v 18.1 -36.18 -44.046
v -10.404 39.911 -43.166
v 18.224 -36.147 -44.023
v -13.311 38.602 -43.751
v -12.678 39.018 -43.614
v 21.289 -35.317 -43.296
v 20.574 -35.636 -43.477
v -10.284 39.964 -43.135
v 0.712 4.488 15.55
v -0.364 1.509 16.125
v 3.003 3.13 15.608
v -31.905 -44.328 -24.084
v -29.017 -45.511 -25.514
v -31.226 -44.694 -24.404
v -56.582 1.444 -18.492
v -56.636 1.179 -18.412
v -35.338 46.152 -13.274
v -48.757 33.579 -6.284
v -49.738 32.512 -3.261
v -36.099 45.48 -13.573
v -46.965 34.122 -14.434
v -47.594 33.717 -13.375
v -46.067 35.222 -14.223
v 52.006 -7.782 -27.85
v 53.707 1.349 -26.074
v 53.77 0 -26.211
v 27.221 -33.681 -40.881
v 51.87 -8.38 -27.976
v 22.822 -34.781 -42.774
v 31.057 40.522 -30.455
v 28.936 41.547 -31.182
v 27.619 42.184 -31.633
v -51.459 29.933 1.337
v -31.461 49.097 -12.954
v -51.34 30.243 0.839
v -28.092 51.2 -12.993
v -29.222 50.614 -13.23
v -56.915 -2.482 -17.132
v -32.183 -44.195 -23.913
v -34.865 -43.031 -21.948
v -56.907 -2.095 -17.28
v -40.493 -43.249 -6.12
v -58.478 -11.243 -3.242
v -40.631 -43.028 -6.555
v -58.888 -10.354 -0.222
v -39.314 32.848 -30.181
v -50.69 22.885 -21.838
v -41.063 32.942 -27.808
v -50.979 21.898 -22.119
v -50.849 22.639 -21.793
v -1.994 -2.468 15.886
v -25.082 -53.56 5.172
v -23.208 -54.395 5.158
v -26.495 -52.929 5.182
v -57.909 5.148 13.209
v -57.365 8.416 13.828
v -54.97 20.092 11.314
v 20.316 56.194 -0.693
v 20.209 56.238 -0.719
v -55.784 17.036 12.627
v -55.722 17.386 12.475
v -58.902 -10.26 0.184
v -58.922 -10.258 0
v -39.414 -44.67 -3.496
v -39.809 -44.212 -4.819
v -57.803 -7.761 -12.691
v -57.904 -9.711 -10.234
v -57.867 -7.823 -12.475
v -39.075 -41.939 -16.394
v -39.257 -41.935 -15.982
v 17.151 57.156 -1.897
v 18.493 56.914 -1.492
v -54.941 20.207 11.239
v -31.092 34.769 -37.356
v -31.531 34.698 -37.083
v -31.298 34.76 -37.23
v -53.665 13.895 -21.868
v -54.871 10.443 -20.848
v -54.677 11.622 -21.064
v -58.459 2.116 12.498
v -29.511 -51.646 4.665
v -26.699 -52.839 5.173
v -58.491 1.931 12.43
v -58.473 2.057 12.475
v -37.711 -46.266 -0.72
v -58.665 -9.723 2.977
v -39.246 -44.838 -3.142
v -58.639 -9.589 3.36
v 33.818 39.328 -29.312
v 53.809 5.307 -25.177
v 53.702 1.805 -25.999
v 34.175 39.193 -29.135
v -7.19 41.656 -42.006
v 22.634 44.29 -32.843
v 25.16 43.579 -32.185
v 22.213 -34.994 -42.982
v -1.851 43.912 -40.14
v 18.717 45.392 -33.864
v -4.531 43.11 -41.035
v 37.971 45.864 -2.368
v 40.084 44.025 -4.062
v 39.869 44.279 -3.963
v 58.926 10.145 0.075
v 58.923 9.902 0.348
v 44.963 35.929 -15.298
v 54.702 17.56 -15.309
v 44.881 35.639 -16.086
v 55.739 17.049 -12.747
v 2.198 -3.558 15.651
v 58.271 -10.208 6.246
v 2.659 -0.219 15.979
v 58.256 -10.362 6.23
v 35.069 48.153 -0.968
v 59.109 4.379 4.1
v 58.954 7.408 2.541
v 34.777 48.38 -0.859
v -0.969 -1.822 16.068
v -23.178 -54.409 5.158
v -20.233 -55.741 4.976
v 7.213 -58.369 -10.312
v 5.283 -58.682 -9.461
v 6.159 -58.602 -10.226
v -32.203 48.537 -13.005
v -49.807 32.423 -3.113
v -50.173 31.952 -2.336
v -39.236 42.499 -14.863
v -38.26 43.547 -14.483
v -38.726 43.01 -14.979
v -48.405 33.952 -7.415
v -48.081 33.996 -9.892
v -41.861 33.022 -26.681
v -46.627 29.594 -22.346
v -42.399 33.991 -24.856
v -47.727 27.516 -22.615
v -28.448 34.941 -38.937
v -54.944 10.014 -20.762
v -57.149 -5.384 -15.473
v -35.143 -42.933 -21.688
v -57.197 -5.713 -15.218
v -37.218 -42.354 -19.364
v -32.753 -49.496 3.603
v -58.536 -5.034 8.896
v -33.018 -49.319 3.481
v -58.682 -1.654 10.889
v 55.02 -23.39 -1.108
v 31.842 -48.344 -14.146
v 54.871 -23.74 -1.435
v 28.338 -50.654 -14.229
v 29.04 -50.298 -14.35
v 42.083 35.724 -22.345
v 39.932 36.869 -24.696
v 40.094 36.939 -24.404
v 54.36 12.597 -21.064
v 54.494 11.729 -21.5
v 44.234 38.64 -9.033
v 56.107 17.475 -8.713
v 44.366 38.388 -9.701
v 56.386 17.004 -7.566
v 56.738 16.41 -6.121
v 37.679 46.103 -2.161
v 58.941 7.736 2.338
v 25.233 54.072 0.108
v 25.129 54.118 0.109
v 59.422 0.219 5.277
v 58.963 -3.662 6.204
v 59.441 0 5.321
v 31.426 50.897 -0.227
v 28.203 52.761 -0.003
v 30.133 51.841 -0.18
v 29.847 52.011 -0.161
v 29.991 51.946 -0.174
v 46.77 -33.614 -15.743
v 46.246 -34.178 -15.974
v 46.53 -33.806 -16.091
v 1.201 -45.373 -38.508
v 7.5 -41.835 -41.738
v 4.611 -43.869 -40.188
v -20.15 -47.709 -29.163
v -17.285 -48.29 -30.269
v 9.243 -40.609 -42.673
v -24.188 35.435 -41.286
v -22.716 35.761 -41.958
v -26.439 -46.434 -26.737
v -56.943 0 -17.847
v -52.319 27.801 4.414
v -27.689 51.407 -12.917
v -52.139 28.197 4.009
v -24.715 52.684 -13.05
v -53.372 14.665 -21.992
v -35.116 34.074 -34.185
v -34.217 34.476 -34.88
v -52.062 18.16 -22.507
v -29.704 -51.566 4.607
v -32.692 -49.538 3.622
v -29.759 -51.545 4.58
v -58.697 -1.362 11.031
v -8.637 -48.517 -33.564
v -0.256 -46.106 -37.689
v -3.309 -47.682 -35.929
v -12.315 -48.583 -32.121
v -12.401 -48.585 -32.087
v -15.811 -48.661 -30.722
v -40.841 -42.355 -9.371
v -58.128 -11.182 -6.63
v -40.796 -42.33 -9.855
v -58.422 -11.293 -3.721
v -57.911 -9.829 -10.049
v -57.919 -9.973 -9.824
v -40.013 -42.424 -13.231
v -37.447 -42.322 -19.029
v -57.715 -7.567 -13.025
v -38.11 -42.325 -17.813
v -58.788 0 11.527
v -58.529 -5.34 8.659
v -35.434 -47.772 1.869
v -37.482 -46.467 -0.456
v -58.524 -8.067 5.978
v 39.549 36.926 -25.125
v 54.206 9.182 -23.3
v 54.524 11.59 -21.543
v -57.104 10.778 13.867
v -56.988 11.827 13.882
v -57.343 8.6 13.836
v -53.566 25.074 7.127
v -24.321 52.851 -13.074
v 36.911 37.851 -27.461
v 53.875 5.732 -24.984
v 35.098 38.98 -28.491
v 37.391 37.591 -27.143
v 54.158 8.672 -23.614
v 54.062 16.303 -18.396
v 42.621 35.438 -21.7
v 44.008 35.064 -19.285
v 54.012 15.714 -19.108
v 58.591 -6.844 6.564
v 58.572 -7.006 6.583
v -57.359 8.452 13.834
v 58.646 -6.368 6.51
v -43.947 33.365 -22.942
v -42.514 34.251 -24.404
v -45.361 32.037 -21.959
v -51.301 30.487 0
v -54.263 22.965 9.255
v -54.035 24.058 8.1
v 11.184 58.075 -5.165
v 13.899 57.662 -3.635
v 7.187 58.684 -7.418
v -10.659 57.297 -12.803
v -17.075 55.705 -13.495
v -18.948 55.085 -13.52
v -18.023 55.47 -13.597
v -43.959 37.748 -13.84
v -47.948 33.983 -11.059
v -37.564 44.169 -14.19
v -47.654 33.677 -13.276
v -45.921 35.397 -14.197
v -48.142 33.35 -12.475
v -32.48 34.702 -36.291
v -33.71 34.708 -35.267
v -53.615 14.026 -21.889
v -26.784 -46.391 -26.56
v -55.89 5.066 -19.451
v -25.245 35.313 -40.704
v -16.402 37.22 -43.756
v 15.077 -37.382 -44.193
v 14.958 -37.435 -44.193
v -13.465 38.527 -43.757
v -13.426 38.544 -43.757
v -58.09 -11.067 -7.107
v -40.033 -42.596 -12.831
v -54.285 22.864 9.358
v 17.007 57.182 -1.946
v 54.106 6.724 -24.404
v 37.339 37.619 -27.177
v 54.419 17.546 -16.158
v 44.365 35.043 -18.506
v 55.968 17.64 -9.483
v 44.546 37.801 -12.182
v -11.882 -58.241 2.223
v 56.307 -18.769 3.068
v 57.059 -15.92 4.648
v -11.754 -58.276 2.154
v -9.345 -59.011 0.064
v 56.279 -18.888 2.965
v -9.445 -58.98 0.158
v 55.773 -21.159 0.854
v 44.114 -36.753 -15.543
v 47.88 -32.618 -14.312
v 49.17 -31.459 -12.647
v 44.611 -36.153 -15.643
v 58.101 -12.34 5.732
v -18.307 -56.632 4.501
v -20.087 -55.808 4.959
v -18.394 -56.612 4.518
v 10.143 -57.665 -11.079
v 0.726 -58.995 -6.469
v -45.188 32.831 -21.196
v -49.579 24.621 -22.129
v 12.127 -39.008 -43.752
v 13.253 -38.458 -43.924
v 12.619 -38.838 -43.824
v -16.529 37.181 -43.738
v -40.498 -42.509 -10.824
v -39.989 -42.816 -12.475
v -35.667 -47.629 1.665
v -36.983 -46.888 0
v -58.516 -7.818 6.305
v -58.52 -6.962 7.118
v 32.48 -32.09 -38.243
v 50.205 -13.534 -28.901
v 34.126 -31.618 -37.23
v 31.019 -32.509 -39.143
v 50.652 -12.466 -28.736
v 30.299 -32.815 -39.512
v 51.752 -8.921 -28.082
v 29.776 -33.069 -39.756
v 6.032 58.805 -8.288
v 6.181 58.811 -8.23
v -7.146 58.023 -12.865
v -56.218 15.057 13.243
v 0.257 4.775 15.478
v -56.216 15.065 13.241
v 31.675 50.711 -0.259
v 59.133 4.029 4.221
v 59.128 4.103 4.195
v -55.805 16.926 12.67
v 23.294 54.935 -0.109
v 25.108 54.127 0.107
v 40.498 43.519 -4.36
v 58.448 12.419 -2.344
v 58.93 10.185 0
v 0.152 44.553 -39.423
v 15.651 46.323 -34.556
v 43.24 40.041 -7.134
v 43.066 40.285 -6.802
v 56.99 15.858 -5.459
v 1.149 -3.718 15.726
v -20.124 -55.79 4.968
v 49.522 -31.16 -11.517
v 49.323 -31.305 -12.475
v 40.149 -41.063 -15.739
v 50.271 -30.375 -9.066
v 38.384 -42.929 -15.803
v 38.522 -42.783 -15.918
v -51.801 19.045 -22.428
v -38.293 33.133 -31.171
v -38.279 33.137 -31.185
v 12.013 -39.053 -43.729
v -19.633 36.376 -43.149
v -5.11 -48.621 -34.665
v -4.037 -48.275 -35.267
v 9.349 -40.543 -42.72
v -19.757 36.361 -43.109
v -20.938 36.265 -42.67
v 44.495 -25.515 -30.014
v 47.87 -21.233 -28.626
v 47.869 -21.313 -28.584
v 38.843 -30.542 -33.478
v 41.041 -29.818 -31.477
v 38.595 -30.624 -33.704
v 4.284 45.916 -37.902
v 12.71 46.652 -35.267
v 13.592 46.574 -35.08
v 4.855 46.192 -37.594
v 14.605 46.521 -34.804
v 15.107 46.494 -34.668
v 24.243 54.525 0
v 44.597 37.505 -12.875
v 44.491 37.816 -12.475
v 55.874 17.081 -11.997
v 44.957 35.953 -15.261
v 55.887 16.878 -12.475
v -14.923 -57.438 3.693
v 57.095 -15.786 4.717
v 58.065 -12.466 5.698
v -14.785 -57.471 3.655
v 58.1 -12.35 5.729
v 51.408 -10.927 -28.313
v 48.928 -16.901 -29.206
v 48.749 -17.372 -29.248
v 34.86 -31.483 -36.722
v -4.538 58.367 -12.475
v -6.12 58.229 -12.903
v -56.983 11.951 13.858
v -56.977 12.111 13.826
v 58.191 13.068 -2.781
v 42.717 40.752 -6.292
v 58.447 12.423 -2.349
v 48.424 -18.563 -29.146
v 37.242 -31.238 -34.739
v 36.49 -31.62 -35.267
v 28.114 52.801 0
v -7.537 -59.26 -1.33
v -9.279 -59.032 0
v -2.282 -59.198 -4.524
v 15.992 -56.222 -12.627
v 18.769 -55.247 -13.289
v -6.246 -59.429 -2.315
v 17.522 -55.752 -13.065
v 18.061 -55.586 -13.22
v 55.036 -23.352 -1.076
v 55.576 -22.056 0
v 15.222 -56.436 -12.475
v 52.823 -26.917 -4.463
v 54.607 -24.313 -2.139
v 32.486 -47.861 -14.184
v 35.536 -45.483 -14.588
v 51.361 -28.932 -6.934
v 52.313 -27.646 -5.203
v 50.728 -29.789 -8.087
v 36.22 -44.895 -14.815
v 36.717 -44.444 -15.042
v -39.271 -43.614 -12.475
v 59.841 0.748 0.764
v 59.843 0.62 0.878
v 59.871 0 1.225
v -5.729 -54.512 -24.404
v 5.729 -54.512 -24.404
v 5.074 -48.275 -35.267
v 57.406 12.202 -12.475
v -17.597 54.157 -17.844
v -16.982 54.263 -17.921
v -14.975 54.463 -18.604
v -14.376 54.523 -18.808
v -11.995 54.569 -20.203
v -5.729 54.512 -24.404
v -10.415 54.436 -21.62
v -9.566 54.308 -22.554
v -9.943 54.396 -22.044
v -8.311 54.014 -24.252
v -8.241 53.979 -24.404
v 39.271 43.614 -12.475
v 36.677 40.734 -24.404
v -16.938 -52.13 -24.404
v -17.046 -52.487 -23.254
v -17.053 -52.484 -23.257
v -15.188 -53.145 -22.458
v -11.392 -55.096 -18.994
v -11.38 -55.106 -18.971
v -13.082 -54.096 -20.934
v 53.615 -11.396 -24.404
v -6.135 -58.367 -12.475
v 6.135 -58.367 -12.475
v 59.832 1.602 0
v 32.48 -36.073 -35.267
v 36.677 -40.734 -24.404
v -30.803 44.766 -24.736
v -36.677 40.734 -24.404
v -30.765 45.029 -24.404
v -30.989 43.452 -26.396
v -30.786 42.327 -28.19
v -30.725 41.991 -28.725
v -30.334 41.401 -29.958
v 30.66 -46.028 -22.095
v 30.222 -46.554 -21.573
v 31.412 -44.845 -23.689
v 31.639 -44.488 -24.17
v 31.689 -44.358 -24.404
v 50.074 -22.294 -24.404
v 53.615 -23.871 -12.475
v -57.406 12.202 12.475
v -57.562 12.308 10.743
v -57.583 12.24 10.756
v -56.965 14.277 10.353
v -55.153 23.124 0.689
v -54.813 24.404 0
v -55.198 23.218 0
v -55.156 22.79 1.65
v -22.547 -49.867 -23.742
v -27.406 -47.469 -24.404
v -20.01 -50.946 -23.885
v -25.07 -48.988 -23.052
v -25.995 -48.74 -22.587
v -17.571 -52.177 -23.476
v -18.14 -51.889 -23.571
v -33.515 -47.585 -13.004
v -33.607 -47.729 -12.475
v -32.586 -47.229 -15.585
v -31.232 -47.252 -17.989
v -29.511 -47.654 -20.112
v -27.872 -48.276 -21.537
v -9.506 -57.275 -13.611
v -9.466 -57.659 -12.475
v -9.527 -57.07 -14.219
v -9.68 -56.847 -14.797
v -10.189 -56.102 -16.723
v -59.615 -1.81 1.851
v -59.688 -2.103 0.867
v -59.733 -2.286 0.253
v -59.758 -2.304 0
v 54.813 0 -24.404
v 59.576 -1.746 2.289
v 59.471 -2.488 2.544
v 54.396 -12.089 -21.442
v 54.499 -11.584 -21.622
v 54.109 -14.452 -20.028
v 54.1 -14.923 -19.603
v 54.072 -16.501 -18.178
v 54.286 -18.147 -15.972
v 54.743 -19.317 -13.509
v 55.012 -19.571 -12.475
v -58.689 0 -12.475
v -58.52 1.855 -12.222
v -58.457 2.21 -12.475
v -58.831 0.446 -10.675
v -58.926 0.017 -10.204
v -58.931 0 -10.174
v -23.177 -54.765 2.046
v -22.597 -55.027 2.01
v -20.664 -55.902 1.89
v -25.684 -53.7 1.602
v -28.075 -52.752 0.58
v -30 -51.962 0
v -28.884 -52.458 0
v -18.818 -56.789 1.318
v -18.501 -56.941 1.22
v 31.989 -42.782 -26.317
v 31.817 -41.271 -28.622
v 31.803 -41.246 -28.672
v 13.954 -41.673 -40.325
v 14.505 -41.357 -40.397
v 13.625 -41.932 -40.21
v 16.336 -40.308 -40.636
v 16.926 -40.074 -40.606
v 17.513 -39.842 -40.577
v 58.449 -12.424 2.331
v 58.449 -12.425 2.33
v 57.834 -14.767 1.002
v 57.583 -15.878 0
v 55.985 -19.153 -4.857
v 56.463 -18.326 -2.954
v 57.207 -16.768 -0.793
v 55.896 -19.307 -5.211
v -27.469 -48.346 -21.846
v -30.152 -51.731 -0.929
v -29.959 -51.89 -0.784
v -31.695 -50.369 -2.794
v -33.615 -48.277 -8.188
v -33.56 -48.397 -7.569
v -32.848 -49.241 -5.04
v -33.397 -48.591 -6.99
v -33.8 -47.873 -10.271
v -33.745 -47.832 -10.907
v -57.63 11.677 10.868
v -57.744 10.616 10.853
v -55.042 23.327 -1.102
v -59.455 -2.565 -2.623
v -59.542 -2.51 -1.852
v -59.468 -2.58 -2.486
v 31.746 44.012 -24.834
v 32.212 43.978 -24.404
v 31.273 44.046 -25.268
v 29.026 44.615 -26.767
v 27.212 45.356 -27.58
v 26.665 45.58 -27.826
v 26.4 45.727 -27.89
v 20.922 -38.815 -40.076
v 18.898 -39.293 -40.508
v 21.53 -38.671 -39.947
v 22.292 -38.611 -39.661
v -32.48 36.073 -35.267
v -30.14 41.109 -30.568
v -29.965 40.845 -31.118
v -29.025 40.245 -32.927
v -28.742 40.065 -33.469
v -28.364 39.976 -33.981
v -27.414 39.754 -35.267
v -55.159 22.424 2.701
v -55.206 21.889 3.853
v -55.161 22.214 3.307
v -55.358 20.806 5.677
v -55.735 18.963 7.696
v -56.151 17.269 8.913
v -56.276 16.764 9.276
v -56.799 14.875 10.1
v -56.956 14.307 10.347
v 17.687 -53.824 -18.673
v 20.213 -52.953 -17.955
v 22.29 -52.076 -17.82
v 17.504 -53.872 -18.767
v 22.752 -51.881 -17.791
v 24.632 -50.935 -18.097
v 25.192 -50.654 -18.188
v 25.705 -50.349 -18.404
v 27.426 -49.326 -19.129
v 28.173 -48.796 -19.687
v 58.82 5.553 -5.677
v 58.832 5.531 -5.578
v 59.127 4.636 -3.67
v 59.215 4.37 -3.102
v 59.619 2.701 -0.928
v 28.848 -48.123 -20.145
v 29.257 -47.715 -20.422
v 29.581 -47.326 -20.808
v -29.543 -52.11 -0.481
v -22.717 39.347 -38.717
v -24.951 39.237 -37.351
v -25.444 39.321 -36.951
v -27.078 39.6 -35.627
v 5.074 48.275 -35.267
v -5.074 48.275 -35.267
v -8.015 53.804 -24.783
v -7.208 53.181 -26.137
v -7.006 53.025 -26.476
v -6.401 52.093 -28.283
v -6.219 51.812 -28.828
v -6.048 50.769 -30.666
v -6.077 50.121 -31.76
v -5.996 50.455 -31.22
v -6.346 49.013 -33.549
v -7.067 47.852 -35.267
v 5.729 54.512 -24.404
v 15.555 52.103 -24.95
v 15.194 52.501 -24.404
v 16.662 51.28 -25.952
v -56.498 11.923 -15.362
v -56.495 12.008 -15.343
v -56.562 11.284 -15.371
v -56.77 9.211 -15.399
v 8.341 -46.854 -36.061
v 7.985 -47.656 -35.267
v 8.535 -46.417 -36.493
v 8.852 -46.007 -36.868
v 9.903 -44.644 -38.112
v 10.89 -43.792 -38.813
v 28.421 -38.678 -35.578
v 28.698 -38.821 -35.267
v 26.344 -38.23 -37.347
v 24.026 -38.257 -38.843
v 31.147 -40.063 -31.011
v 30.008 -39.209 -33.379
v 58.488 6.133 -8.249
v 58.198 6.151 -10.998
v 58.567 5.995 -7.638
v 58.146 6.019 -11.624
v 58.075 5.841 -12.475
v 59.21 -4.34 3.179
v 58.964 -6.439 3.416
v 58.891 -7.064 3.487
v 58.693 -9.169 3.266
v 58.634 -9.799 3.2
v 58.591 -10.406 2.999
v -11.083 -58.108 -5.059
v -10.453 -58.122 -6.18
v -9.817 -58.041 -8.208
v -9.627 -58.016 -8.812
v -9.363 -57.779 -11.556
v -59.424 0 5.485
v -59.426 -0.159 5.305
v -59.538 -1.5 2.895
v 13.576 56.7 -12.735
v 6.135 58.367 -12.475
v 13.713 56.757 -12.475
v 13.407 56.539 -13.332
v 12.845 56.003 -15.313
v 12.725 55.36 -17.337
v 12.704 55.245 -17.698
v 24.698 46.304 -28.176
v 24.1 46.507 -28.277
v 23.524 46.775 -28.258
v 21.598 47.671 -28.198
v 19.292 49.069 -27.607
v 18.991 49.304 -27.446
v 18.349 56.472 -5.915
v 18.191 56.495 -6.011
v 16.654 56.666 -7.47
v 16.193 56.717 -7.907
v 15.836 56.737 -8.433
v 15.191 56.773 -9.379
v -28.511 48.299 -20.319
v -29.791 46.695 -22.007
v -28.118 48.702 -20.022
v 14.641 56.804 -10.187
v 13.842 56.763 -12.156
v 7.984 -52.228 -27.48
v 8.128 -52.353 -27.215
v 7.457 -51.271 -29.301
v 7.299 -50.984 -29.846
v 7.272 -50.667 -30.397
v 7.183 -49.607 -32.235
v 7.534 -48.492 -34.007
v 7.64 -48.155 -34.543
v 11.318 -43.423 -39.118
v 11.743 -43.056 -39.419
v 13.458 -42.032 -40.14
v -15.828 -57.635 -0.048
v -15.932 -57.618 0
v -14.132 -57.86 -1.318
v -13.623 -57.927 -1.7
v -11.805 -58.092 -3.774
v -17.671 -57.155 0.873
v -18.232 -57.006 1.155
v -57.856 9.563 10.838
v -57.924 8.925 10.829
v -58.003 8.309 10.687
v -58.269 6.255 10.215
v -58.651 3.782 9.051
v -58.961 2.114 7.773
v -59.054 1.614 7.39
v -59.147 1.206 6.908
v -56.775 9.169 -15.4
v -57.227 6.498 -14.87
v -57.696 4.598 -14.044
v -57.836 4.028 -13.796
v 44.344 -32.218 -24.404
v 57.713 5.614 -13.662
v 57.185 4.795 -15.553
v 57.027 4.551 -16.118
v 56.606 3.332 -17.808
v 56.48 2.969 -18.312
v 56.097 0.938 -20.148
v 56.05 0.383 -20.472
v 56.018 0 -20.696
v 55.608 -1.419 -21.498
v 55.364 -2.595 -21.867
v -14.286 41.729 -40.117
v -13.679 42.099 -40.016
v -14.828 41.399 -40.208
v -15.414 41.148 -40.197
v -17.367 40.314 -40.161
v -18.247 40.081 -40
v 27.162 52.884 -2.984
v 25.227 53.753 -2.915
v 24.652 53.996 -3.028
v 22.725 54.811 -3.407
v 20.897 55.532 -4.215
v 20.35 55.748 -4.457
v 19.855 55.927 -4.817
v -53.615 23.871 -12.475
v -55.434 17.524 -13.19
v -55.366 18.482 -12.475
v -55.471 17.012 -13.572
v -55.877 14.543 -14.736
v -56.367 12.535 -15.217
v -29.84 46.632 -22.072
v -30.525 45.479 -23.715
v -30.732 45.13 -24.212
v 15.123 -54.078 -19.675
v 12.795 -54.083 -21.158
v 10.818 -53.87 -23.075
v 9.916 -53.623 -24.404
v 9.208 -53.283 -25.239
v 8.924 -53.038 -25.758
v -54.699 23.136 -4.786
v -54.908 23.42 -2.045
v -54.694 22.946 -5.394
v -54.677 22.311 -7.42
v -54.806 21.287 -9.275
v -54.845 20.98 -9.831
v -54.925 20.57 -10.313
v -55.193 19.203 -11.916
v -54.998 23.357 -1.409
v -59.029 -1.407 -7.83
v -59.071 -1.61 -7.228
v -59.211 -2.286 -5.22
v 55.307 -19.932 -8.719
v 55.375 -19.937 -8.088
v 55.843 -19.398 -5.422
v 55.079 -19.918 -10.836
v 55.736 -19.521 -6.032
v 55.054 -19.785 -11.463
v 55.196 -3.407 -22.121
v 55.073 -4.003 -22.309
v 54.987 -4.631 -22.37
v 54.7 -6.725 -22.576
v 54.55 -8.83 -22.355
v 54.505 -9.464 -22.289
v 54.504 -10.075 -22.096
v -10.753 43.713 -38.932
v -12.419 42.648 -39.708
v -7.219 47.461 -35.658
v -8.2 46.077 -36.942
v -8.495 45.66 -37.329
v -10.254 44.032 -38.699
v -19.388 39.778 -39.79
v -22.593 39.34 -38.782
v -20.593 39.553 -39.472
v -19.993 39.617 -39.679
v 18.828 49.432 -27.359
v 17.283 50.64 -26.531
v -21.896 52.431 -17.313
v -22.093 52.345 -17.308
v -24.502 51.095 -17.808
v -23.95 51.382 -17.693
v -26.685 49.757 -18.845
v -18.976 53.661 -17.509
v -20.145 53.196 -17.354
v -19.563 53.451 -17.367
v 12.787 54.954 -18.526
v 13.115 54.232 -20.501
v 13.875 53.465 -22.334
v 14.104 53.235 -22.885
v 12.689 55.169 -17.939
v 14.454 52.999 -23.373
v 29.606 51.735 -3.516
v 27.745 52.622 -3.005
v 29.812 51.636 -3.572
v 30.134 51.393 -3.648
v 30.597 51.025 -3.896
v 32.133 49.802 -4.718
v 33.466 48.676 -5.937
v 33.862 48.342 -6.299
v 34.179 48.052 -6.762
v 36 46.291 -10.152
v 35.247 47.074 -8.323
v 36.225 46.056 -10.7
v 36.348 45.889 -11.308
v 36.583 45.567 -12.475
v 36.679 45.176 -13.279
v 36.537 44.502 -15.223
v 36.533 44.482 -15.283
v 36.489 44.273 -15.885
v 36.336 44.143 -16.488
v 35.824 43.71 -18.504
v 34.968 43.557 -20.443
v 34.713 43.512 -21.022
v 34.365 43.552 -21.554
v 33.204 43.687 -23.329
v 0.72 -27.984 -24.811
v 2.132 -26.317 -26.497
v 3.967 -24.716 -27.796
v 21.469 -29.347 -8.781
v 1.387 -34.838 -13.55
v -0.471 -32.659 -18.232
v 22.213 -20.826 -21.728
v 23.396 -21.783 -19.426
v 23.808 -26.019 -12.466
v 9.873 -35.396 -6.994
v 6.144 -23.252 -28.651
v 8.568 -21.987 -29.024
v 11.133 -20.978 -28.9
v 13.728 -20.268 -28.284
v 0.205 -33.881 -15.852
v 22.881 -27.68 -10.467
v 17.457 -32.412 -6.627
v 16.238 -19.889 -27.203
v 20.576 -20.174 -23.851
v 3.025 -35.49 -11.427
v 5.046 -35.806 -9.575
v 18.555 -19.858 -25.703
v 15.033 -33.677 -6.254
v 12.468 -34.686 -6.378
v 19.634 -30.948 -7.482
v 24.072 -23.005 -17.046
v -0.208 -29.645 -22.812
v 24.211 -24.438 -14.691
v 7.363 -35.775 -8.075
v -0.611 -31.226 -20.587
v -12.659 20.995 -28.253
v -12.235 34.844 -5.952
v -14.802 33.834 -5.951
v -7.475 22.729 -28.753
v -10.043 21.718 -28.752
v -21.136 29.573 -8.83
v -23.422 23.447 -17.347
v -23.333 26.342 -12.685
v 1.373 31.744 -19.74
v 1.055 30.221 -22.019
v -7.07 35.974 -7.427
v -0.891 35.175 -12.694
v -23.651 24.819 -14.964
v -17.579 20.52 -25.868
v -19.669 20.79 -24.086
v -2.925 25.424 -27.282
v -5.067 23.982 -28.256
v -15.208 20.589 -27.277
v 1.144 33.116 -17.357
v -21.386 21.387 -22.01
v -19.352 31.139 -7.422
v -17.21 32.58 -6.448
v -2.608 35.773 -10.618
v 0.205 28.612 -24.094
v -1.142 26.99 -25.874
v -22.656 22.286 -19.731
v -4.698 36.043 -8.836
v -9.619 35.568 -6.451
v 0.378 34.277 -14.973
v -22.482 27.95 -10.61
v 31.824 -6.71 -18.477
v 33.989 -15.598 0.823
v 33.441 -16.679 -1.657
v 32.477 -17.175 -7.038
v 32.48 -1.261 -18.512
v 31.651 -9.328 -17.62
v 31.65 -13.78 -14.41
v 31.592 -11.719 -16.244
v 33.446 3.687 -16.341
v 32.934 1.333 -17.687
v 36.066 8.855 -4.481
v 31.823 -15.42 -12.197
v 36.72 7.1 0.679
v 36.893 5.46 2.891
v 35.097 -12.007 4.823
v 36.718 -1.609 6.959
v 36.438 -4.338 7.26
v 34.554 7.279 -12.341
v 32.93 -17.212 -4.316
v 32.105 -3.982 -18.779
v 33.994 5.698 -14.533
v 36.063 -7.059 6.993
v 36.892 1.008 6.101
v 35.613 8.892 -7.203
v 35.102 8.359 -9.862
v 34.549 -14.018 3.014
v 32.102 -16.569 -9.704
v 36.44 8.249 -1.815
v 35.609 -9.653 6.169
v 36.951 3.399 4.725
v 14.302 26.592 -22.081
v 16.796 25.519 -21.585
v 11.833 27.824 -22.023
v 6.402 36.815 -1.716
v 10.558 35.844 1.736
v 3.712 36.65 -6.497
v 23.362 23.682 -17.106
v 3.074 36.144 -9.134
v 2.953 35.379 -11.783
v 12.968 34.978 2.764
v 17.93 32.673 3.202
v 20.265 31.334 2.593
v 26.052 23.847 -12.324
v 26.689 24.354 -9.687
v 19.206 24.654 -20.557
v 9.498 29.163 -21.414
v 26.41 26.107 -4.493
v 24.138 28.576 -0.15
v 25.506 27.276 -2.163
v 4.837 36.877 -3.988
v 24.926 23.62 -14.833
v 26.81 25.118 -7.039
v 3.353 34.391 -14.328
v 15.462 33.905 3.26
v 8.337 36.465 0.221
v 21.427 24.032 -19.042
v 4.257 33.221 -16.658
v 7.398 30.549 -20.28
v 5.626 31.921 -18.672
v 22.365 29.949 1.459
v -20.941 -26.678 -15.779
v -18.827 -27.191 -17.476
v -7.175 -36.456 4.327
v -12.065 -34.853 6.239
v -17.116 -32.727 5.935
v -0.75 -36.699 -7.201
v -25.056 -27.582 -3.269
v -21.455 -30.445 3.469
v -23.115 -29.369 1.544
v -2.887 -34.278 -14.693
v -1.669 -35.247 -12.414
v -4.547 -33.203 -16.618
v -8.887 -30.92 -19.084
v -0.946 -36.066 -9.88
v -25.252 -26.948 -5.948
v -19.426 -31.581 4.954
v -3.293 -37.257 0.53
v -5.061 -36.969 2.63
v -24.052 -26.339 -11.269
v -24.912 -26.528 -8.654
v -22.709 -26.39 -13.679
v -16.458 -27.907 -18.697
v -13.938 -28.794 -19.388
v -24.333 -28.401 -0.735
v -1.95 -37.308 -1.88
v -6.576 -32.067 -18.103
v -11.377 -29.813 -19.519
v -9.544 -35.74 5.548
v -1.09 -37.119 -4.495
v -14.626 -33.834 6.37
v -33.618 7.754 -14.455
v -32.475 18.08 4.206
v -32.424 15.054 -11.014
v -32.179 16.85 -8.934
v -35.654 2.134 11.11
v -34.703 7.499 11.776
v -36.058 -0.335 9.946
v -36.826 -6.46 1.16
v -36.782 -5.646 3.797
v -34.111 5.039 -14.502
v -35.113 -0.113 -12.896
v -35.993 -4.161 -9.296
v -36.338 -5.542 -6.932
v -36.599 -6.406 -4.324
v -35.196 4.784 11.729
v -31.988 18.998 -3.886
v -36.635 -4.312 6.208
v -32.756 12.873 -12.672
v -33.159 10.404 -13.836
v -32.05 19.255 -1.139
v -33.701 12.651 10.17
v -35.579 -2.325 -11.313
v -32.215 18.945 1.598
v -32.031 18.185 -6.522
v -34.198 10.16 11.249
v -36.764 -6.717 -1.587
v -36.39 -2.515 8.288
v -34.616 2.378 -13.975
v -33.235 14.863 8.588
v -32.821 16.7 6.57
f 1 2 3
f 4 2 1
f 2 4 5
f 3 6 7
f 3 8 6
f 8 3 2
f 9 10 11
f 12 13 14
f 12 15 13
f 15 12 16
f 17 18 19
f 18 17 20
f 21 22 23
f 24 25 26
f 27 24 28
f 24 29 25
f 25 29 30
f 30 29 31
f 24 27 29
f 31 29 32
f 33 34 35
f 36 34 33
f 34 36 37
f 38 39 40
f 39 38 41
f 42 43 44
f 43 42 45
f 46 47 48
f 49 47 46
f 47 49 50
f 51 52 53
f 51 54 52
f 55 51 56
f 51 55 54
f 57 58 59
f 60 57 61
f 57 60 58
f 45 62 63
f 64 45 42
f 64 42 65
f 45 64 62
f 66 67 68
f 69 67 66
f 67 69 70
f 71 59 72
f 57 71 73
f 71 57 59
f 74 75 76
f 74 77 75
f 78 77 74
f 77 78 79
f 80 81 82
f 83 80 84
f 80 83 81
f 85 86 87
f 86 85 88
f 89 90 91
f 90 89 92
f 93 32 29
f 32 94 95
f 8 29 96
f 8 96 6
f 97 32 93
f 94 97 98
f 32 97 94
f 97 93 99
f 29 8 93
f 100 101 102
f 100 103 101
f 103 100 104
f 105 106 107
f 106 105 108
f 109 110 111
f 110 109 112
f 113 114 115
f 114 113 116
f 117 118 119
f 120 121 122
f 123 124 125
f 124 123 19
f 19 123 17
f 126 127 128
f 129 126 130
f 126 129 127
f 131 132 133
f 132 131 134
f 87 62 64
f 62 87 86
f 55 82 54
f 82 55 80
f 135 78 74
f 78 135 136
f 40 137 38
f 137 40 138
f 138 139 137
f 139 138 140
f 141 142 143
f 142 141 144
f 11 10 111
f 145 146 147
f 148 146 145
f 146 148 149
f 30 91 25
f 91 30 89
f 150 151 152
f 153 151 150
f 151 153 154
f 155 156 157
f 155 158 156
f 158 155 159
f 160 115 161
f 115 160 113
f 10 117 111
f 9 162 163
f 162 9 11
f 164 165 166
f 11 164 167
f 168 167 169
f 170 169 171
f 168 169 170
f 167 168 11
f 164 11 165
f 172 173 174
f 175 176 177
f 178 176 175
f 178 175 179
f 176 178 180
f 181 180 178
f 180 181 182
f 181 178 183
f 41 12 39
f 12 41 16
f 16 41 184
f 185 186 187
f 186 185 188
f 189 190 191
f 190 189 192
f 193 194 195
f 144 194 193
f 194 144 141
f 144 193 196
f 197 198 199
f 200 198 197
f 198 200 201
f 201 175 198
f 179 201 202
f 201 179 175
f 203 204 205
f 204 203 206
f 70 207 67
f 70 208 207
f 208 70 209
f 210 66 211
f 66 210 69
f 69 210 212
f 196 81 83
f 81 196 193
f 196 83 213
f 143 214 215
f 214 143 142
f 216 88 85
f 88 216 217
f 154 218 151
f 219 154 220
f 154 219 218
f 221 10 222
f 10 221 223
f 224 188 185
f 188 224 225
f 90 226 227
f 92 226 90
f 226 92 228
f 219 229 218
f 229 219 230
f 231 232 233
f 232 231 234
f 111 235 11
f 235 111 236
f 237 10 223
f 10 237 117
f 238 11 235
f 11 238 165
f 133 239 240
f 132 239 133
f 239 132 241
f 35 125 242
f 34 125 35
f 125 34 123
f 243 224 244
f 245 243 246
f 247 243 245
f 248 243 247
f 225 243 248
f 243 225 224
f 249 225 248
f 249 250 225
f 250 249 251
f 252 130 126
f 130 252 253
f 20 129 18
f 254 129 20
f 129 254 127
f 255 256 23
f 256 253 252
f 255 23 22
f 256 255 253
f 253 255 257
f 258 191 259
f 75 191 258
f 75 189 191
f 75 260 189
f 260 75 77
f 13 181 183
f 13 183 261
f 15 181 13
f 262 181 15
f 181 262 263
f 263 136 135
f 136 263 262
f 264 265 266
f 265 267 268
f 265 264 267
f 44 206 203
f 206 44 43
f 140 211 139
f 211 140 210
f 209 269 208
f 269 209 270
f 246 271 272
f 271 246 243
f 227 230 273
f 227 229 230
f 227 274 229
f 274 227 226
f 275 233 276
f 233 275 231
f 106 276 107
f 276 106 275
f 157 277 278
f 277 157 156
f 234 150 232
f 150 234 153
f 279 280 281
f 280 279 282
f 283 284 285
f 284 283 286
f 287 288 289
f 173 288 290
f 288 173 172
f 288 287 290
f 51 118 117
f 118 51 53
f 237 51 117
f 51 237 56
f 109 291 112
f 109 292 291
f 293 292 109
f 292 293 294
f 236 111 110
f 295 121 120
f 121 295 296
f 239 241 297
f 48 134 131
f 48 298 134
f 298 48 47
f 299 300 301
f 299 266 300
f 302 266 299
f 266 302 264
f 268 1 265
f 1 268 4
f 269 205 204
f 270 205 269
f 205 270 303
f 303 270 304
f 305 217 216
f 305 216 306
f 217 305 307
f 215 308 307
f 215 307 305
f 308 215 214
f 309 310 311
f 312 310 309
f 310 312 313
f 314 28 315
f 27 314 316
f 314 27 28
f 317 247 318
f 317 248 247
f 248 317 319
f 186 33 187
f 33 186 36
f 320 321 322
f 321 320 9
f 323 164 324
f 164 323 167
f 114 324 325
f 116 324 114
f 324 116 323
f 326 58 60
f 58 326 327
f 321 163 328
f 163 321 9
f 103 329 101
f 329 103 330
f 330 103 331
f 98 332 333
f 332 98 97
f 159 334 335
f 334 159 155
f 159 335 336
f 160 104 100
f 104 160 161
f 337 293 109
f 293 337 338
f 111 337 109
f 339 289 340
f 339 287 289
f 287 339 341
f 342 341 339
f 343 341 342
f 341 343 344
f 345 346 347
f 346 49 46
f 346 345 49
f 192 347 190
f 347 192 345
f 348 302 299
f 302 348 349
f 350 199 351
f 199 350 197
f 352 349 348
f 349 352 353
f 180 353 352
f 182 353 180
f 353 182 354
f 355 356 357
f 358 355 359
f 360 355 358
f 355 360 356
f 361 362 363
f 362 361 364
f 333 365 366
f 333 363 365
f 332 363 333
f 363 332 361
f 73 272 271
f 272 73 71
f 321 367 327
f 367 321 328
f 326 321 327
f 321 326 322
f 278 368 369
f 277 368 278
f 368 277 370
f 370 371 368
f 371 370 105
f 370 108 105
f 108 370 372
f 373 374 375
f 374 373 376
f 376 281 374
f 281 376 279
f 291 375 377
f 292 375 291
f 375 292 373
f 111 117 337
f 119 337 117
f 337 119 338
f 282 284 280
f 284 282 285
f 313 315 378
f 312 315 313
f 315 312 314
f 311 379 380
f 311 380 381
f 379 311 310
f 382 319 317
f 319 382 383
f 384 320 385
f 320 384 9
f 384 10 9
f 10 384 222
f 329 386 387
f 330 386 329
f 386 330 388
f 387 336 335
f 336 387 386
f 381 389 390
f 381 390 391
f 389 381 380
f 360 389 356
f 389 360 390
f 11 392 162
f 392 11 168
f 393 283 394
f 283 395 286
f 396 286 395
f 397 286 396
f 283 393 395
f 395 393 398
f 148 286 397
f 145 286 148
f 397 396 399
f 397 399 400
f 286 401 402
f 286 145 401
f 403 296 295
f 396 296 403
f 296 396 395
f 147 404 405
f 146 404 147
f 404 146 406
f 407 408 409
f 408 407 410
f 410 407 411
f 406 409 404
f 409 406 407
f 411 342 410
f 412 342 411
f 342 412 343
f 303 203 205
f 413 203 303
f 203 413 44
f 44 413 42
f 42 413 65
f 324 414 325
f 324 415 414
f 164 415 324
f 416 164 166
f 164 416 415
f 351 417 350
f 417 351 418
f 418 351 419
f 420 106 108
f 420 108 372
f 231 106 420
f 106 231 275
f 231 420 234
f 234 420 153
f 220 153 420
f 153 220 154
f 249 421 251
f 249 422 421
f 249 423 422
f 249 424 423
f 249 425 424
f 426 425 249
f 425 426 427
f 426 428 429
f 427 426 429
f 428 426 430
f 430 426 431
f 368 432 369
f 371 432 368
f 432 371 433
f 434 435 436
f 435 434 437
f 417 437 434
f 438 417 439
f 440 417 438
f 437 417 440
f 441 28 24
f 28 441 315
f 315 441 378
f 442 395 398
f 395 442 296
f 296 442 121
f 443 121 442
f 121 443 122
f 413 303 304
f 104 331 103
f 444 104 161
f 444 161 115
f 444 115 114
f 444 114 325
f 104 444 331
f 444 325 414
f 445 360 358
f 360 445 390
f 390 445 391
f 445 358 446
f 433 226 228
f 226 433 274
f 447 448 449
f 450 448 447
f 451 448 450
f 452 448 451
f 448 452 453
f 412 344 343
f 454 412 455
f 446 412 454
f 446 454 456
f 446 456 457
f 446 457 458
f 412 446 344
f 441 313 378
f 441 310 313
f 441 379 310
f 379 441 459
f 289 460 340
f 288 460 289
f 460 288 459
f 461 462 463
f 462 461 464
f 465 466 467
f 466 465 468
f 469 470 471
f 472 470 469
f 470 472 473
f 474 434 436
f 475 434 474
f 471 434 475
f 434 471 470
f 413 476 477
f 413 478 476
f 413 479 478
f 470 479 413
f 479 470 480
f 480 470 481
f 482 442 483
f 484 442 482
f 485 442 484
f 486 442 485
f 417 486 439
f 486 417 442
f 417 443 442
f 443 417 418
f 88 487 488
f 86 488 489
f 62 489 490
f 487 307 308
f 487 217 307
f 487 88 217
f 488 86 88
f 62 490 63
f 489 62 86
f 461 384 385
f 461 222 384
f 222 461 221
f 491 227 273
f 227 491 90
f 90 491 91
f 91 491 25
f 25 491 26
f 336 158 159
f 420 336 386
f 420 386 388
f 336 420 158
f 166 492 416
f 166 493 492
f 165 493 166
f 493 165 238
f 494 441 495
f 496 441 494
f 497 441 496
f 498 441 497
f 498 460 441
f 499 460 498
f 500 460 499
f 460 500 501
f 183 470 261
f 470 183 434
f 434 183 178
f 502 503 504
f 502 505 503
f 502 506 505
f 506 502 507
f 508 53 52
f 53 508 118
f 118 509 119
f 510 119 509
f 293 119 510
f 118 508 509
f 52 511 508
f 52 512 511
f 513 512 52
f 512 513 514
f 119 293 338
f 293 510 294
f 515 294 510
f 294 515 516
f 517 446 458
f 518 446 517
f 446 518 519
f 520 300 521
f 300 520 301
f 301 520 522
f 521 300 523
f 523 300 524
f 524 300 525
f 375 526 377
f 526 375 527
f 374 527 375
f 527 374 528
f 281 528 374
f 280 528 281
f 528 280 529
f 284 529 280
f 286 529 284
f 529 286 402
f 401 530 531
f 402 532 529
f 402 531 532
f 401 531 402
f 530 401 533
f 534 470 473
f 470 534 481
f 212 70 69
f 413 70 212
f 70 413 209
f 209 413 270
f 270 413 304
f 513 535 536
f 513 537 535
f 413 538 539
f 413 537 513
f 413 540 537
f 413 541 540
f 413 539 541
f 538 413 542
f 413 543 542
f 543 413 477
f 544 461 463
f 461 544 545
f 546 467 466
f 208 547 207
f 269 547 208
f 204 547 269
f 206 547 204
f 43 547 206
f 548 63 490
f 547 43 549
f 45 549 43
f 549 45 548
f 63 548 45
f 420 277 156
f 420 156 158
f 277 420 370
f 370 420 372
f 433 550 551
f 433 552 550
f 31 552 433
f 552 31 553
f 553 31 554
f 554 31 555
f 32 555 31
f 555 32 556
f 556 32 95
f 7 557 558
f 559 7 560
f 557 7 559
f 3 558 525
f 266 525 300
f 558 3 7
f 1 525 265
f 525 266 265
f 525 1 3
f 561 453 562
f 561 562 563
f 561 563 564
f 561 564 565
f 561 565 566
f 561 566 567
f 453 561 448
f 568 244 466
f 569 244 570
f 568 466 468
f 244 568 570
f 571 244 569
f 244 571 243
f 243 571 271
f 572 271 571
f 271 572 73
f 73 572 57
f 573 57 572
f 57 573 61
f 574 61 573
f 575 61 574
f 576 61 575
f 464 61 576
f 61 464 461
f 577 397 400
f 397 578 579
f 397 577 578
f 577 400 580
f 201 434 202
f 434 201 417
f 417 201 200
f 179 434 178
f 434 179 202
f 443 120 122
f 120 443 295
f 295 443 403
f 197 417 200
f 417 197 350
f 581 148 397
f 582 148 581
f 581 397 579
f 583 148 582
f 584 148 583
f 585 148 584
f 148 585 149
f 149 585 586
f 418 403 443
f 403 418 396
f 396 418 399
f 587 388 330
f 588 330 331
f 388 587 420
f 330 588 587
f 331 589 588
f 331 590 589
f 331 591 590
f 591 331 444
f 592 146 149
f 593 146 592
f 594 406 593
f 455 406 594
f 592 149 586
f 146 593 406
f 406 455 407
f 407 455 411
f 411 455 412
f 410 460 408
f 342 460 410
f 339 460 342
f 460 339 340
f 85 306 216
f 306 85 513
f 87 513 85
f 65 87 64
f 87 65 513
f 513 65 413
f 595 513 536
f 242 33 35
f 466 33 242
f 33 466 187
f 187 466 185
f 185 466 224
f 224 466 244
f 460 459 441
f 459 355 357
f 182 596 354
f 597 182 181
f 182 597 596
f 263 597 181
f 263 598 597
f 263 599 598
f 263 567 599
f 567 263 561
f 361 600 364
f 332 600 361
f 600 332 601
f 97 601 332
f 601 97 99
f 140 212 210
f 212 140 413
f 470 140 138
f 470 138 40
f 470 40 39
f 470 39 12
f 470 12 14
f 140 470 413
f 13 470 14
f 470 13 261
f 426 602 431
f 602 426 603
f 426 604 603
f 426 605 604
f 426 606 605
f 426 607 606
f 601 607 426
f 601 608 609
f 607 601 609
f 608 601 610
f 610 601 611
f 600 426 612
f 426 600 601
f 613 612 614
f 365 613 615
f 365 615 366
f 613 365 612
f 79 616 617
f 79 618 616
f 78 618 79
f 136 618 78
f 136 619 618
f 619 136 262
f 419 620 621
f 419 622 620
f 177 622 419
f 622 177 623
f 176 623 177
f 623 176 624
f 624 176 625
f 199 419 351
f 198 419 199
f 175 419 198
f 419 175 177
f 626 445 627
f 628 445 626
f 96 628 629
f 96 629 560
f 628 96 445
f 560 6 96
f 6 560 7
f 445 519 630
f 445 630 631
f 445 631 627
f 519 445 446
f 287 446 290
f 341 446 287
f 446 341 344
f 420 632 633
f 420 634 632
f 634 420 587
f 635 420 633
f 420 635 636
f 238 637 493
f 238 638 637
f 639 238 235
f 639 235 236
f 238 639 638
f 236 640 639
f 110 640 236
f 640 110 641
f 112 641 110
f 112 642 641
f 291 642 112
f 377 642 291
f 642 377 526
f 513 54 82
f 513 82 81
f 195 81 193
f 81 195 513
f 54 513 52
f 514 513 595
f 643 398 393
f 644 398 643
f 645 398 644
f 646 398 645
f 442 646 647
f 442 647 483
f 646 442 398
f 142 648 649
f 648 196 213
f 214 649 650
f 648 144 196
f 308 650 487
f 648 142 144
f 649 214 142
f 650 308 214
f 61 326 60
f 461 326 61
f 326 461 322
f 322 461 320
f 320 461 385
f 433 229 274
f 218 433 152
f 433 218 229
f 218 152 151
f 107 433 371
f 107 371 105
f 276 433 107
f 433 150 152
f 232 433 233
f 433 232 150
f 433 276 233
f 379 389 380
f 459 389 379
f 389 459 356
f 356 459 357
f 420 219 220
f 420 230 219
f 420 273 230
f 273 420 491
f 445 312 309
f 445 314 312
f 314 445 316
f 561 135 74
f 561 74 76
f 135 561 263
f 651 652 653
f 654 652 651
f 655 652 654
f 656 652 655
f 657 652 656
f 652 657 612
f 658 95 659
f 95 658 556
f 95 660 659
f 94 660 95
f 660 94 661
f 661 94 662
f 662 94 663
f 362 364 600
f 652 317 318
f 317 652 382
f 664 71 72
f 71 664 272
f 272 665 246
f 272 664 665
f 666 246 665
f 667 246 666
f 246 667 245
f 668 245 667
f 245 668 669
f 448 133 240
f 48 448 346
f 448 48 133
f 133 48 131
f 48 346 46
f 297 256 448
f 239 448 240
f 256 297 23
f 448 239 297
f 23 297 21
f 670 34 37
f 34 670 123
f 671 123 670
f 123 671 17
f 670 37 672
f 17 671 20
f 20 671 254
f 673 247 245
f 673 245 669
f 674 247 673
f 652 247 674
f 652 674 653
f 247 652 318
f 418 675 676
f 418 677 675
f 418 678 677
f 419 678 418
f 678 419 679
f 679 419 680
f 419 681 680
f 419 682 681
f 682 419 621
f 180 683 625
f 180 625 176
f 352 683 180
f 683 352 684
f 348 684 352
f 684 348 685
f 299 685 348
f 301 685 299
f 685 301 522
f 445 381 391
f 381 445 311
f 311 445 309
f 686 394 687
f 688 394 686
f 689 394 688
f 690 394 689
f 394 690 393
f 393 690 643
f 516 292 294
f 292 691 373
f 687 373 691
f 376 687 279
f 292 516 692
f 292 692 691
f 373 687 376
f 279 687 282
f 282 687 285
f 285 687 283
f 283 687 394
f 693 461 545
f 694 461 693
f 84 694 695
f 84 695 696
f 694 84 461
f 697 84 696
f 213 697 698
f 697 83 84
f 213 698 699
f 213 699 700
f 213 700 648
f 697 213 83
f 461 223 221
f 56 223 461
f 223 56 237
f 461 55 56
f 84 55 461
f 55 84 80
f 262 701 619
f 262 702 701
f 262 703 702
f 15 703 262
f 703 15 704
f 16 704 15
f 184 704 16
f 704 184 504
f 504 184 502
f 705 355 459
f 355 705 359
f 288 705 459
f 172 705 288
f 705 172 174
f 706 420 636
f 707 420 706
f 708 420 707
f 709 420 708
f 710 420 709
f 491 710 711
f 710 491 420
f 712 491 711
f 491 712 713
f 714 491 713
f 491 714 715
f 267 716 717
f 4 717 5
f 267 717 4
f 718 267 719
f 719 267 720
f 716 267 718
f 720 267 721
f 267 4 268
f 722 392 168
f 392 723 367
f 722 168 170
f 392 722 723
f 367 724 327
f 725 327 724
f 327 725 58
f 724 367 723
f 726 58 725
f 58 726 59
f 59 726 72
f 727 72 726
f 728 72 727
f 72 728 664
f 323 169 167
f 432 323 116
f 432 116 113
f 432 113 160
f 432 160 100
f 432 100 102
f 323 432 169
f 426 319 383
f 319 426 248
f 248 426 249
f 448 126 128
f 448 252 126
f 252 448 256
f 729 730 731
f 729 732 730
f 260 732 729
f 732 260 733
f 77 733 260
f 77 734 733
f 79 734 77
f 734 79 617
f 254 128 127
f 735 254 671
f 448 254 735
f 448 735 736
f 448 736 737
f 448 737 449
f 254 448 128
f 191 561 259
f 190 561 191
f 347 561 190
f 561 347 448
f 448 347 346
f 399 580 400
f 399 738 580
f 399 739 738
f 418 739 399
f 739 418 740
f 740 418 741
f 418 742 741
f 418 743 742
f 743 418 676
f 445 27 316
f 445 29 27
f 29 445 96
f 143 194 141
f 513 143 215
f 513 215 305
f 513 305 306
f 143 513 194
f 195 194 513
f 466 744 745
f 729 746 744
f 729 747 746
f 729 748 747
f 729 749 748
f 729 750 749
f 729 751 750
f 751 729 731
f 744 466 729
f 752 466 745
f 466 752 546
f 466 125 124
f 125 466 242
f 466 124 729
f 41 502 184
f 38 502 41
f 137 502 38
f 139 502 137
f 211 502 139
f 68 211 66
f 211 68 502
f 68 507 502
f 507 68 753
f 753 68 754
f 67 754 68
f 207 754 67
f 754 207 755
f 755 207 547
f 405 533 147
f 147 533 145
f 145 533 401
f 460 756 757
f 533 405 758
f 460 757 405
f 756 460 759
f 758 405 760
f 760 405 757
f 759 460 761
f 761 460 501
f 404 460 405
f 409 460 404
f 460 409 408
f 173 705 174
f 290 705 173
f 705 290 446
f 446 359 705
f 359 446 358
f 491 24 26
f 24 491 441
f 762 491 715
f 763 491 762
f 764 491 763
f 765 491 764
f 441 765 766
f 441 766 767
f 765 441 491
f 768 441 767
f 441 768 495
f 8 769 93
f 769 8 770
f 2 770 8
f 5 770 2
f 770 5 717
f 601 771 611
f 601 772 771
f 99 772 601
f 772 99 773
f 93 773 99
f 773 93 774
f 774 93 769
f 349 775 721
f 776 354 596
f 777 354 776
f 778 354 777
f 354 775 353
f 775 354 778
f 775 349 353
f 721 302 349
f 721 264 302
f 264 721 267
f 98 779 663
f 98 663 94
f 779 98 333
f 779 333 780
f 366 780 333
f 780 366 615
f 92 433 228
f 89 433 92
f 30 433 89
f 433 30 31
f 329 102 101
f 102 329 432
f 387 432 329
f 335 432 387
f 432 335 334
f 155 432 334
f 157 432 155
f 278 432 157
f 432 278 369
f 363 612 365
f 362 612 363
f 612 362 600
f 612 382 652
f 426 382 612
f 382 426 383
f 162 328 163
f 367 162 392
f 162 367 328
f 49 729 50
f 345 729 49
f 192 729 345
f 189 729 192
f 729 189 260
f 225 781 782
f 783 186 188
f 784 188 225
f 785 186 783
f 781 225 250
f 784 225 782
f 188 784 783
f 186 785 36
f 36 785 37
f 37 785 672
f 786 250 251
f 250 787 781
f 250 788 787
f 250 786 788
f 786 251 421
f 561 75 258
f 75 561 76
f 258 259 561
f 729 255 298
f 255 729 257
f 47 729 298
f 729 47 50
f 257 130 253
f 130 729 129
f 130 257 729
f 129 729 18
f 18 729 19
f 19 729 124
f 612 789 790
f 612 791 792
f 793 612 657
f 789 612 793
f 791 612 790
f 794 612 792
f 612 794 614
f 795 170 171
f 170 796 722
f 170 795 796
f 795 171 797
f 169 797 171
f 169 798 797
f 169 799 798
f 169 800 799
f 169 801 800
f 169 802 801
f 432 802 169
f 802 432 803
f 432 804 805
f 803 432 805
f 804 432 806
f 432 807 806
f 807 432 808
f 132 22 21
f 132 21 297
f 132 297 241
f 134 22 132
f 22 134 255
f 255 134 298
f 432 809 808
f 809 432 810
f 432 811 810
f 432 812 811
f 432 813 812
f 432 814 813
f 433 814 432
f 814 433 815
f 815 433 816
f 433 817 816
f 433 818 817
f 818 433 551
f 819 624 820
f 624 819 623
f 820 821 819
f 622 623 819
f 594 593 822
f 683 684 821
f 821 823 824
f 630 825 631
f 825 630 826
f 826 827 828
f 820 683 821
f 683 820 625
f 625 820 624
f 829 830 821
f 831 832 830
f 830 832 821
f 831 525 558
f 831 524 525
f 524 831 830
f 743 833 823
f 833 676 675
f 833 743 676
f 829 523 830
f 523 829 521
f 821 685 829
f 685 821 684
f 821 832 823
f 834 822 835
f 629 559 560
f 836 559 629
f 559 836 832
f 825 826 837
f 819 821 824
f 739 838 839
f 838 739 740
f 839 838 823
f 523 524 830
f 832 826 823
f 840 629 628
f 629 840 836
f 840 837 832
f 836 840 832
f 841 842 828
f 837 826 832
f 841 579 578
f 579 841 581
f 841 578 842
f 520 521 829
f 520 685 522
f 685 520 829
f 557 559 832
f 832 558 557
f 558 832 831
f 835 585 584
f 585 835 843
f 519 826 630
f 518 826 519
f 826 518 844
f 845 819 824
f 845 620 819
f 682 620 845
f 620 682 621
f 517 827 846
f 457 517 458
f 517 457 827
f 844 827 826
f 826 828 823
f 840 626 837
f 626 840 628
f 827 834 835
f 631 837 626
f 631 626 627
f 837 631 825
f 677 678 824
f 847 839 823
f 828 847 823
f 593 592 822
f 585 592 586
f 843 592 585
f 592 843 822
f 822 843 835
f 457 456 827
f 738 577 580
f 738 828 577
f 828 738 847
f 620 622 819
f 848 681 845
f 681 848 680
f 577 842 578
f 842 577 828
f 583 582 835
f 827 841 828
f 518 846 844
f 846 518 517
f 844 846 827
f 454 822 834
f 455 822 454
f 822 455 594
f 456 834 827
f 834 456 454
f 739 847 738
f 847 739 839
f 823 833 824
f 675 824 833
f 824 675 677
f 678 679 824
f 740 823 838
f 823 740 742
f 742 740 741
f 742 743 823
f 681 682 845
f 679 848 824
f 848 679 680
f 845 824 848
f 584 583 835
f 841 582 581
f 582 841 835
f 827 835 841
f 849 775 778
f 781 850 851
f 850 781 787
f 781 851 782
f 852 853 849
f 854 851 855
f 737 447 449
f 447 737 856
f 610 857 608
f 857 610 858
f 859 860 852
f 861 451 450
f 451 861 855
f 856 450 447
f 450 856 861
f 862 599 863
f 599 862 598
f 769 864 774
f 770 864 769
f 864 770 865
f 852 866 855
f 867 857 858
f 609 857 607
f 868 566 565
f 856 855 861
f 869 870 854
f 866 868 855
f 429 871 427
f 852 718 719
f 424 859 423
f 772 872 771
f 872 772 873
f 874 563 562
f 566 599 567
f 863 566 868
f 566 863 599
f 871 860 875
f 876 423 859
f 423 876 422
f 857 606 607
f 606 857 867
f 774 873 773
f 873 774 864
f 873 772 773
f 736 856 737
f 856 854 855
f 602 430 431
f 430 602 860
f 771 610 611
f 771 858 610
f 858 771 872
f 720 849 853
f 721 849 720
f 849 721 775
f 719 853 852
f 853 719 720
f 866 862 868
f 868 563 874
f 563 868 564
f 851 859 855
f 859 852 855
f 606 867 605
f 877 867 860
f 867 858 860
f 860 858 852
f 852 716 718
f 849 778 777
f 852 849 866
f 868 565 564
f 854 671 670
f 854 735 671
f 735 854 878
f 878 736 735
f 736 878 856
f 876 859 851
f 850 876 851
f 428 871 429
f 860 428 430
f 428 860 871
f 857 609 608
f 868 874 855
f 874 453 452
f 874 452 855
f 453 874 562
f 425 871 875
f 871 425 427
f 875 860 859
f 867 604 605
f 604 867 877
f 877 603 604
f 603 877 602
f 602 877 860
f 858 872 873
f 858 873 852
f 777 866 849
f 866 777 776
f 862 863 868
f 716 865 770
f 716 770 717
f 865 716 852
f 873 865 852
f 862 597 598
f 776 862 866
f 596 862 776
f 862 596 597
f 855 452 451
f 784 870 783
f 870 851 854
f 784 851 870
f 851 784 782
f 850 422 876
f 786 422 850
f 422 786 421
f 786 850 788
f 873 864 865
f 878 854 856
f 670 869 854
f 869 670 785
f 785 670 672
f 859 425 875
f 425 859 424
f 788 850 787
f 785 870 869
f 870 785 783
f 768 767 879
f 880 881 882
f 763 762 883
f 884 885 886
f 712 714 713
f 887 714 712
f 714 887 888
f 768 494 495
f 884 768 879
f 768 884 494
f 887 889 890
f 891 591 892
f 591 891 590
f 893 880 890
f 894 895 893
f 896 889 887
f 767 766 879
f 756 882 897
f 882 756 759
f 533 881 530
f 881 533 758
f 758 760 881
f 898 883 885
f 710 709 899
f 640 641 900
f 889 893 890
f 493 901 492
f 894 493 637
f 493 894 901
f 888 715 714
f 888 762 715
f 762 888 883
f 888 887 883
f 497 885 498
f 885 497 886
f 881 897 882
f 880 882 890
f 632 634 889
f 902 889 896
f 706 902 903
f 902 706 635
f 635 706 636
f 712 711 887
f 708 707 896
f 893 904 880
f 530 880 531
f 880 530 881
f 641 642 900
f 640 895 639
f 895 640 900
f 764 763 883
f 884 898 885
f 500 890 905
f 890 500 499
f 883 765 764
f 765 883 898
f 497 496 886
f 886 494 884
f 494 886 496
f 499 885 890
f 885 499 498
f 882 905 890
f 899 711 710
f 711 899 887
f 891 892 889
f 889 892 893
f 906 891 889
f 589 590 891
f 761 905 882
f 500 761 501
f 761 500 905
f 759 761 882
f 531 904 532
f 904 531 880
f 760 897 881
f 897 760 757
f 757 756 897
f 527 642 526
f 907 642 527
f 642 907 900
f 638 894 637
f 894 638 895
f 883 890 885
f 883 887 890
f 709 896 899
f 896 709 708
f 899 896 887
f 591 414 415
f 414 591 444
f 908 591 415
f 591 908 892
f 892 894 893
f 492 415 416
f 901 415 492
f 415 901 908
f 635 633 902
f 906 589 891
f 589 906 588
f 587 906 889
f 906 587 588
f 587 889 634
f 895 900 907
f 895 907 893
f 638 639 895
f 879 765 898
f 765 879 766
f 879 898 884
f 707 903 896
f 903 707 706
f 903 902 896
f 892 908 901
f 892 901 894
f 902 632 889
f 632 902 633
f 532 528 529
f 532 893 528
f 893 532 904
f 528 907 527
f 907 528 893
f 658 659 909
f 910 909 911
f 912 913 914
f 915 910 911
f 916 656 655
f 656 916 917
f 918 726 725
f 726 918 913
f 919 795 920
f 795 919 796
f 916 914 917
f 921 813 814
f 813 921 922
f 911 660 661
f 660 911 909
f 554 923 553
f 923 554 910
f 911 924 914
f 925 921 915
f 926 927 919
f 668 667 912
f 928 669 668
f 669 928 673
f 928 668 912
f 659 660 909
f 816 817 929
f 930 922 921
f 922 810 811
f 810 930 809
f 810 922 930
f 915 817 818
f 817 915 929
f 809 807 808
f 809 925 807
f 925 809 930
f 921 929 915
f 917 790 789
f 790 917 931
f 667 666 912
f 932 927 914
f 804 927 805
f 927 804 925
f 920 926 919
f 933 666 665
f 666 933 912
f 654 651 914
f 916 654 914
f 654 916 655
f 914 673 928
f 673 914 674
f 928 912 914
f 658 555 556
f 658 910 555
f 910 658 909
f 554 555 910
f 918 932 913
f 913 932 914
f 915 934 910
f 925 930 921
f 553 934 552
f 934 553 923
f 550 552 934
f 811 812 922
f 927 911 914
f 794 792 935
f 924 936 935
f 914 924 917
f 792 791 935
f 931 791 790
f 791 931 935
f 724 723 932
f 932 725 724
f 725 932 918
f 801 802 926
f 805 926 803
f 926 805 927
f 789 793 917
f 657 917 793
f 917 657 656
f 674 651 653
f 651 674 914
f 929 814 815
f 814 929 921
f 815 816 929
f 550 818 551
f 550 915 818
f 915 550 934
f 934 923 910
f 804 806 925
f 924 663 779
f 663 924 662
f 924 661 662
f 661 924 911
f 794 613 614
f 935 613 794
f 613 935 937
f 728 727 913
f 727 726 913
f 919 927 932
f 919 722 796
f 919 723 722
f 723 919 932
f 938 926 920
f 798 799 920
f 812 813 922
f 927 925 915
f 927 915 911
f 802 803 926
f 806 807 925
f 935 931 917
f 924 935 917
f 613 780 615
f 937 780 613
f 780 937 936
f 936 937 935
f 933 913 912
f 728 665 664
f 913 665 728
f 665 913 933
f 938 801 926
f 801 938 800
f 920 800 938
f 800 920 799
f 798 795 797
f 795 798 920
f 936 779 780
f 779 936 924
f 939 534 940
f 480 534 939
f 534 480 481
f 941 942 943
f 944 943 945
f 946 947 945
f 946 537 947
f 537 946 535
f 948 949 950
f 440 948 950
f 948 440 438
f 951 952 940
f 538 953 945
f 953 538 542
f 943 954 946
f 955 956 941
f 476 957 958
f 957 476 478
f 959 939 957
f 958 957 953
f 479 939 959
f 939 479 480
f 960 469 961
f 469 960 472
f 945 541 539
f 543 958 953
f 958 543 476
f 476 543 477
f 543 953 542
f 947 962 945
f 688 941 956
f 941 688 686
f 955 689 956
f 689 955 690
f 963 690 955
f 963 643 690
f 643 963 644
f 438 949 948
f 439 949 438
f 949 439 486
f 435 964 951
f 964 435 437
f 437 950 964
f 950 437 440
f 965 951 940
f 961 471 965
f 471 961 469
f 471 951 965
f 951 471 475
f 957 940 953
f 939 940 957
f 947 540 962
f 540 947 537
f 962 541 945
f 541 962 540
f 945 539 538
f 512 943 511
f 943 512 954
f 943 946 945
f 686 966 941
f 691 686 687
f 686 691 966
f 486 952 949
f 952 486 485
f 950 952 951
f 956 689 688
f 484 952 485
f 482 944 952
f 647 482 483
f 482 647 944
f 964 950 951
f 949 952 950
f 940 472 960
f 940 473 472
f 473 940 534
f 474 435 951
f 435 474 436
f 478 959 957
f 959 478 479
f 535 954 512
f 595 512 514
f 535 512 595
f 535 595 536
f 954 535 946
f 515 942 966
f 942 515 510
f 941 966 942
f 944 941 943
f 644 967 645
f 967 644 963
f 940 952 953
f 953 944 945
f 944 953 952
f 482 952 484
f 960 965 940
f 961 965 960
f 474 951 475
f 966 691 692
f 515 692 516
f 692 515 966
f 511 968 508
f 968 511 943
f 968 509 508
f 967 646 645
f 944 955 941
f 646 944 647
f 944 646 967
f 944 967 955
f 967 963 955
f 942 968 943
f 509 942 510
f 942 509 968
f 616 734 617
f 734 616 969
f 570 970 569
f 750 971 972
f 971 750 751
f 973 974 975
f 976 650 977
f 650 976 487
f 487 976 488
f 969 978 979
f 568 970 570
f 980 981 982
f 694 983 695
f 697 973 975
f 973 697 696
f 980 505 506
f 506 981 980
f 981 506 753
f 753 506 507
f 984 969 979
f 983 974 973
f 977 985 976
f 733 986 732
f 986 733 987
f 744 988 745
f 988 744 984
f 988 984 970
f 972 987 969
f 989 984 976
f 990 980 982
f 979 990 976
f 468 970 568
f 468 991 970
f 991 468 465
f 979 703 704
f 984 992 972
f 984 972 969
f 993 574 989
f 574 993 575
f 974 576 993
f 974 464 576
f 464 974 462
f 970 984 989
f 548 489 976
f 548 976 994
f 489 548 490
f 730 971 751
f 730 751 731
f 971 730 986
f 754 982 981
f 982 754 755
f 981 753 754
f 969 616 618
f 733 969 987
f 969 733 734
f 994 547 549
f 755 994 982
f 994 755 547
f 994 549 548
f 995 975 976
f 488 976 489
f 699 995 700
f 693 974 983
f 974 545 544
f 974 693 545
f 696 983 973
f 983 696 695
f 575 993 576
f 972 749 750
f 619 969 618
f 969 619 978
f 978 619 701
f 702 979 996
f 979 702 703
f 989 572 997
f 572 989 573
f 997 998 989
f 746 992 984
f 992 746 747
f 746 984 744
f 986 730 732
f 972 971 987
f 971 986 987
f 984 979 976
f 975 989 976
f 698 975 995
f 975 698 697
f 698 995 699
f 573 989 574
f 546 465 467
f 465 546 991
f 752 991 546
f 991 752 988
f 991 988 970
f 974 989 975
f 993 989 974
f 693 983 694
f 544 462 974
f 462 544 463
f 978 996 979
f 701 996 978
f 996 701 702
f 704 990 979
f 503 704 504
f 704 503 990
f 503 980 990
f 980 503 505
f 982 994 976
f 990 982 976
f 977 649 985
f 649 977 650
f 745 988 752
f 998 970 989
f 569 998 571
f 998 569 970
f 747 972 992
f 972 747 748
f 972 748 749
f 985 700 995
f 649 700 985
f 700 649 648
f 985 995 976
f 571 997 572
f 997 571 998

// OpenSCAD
difference() {
	intersection() {
		hull() {
			rotate(a = -88.7188562033, v = [0.3782103142, -0.9254496550, 0.0000000000]) {
				rotate(a = -90.0000000000, v = [-0.6087614290, -0.7933533403, 0.0000000000]) {
					cylinder(h = 60, r = 16.2000000000);
				}
			}
			rotate(a = -88.7188562033, v = [0.3782103142, -0.9254496550, 0.0000000000]) {
				rotate(a = -90.0000000000, v = [0.9914448614, -0.1305261922, 0.0000000000]) {
					cylinder(h = 60, r = 16.2000000000);
				}
			}
			rotate(a = -88.7188562033, v = [0.3782103142, -0.9254496550, 0.0000000000]) {
				rotate(a = -30.9572897354, v = [-0.3752236381, -0.3518714557, 0.0000000000]) {
					cylinder(h = 60, r = 16.2000000000);
				}
			}
			rotate(a = -88.7188562033, v = [0.3782103142, -0.9254496550, 0.0000000000]) {
				rotate(a = -44.4101790692, v = [0.6994460914, -0.0219448216, 0.0000000000]) {
					cylinder(h = 60, r = 16.2000000000);
				}
			}
			rotate(a = -88.7188562033, v = [0.3782103142, -0.9254496550, 0.0000000000]) {
				rotate(a = -133.7770785757, v = [-0.5838132168, -0.4248525055, 0.0000000000]) {
					cylinder(h = 60, r = 16.2000000000);
				}
			}
			rotate(a = -88.7188562033, v = [0.3782103142, -0.9254496550, 0.0000000000]) {
				rotate(a = -147.4470048335, v = [0.5053465272, 0.1848090856, -0.0000000000]) {
					cylinder(h = 60, r = 16.2000000000);
				}
			}
		}
		sphere(r = 60);
	}
	union() {
		rotate(a = -88.7188562033, v = [0.3782103142, -0.9254496550, 0.0000000000]) {
			rotate(a = -90.0000000000, v = [-0.6087614290, -0.7933533403, 0.0000000000]) {
				translate(v = [0, 0, 35]) {
					cylinder(h = 100, r = 13.2000000000);
				}
			}
		}
		rotate(a = -88.7188562033, v = [0.3782103142, -0.9254496550, 0.0000000000]) {
			rotate(a = -90.0000000000, v = [0.9914448614, -0.1305261922, 0.0000000000]) {
				translate(v = [0, 0, 35]) {
					cylinder(h = 100, r = 13.2000000000);
				}
			}
		}
		rotate(a = -88.7188562033, v = [0.3782103142, -0.9254496550, 0.0000000000]) {
			rotate(a = -30.9572897354, v = [-0.3752236381, -0.3518714557, 0.0000000000]) {
				translate(v = [0, 0, 35]) {
					cylinder(h = 100, r = 13.2000000000);
				}
			}
		}
		rotate(a = -88.7188562033, v = [0.3782103142, -0.9254496550, 0.0000000000]) {
			rotate(a = -44.4101790692, v = [0.6994460914, -0.0219448216, 0.0000000000]) {
				translate(v = [0, 0, 35]) {
					cylinder(h = 100, r = 13.2000000000);
				}
			}
		}
		rotate(a = -88.7188562033, v = [0.3782103142, -0.9254496550, 0.0000000000]) {
			rotate(a = -133.7770785757, v = [-0.5838132168, -0.4248525055, 0.0000000000]) {
				translate(v = [0, 0, 35]) {
					cylinder(h = 100, r = 13.2000000000);
				}
			}
		}
		rotate(a = -88.7188562033, v = [0.3782103142, -0.9254496550, 0.0000000000]) {
			rotate(a = -147.4470048335, v = [0.5053465272, 0.1848090856, -0.0000000000]) {
				translate(v = [0, 0, 35]) {
					cylinder(h = 100, r = 13.2000000000);
				}
			}
		}
	}
}
